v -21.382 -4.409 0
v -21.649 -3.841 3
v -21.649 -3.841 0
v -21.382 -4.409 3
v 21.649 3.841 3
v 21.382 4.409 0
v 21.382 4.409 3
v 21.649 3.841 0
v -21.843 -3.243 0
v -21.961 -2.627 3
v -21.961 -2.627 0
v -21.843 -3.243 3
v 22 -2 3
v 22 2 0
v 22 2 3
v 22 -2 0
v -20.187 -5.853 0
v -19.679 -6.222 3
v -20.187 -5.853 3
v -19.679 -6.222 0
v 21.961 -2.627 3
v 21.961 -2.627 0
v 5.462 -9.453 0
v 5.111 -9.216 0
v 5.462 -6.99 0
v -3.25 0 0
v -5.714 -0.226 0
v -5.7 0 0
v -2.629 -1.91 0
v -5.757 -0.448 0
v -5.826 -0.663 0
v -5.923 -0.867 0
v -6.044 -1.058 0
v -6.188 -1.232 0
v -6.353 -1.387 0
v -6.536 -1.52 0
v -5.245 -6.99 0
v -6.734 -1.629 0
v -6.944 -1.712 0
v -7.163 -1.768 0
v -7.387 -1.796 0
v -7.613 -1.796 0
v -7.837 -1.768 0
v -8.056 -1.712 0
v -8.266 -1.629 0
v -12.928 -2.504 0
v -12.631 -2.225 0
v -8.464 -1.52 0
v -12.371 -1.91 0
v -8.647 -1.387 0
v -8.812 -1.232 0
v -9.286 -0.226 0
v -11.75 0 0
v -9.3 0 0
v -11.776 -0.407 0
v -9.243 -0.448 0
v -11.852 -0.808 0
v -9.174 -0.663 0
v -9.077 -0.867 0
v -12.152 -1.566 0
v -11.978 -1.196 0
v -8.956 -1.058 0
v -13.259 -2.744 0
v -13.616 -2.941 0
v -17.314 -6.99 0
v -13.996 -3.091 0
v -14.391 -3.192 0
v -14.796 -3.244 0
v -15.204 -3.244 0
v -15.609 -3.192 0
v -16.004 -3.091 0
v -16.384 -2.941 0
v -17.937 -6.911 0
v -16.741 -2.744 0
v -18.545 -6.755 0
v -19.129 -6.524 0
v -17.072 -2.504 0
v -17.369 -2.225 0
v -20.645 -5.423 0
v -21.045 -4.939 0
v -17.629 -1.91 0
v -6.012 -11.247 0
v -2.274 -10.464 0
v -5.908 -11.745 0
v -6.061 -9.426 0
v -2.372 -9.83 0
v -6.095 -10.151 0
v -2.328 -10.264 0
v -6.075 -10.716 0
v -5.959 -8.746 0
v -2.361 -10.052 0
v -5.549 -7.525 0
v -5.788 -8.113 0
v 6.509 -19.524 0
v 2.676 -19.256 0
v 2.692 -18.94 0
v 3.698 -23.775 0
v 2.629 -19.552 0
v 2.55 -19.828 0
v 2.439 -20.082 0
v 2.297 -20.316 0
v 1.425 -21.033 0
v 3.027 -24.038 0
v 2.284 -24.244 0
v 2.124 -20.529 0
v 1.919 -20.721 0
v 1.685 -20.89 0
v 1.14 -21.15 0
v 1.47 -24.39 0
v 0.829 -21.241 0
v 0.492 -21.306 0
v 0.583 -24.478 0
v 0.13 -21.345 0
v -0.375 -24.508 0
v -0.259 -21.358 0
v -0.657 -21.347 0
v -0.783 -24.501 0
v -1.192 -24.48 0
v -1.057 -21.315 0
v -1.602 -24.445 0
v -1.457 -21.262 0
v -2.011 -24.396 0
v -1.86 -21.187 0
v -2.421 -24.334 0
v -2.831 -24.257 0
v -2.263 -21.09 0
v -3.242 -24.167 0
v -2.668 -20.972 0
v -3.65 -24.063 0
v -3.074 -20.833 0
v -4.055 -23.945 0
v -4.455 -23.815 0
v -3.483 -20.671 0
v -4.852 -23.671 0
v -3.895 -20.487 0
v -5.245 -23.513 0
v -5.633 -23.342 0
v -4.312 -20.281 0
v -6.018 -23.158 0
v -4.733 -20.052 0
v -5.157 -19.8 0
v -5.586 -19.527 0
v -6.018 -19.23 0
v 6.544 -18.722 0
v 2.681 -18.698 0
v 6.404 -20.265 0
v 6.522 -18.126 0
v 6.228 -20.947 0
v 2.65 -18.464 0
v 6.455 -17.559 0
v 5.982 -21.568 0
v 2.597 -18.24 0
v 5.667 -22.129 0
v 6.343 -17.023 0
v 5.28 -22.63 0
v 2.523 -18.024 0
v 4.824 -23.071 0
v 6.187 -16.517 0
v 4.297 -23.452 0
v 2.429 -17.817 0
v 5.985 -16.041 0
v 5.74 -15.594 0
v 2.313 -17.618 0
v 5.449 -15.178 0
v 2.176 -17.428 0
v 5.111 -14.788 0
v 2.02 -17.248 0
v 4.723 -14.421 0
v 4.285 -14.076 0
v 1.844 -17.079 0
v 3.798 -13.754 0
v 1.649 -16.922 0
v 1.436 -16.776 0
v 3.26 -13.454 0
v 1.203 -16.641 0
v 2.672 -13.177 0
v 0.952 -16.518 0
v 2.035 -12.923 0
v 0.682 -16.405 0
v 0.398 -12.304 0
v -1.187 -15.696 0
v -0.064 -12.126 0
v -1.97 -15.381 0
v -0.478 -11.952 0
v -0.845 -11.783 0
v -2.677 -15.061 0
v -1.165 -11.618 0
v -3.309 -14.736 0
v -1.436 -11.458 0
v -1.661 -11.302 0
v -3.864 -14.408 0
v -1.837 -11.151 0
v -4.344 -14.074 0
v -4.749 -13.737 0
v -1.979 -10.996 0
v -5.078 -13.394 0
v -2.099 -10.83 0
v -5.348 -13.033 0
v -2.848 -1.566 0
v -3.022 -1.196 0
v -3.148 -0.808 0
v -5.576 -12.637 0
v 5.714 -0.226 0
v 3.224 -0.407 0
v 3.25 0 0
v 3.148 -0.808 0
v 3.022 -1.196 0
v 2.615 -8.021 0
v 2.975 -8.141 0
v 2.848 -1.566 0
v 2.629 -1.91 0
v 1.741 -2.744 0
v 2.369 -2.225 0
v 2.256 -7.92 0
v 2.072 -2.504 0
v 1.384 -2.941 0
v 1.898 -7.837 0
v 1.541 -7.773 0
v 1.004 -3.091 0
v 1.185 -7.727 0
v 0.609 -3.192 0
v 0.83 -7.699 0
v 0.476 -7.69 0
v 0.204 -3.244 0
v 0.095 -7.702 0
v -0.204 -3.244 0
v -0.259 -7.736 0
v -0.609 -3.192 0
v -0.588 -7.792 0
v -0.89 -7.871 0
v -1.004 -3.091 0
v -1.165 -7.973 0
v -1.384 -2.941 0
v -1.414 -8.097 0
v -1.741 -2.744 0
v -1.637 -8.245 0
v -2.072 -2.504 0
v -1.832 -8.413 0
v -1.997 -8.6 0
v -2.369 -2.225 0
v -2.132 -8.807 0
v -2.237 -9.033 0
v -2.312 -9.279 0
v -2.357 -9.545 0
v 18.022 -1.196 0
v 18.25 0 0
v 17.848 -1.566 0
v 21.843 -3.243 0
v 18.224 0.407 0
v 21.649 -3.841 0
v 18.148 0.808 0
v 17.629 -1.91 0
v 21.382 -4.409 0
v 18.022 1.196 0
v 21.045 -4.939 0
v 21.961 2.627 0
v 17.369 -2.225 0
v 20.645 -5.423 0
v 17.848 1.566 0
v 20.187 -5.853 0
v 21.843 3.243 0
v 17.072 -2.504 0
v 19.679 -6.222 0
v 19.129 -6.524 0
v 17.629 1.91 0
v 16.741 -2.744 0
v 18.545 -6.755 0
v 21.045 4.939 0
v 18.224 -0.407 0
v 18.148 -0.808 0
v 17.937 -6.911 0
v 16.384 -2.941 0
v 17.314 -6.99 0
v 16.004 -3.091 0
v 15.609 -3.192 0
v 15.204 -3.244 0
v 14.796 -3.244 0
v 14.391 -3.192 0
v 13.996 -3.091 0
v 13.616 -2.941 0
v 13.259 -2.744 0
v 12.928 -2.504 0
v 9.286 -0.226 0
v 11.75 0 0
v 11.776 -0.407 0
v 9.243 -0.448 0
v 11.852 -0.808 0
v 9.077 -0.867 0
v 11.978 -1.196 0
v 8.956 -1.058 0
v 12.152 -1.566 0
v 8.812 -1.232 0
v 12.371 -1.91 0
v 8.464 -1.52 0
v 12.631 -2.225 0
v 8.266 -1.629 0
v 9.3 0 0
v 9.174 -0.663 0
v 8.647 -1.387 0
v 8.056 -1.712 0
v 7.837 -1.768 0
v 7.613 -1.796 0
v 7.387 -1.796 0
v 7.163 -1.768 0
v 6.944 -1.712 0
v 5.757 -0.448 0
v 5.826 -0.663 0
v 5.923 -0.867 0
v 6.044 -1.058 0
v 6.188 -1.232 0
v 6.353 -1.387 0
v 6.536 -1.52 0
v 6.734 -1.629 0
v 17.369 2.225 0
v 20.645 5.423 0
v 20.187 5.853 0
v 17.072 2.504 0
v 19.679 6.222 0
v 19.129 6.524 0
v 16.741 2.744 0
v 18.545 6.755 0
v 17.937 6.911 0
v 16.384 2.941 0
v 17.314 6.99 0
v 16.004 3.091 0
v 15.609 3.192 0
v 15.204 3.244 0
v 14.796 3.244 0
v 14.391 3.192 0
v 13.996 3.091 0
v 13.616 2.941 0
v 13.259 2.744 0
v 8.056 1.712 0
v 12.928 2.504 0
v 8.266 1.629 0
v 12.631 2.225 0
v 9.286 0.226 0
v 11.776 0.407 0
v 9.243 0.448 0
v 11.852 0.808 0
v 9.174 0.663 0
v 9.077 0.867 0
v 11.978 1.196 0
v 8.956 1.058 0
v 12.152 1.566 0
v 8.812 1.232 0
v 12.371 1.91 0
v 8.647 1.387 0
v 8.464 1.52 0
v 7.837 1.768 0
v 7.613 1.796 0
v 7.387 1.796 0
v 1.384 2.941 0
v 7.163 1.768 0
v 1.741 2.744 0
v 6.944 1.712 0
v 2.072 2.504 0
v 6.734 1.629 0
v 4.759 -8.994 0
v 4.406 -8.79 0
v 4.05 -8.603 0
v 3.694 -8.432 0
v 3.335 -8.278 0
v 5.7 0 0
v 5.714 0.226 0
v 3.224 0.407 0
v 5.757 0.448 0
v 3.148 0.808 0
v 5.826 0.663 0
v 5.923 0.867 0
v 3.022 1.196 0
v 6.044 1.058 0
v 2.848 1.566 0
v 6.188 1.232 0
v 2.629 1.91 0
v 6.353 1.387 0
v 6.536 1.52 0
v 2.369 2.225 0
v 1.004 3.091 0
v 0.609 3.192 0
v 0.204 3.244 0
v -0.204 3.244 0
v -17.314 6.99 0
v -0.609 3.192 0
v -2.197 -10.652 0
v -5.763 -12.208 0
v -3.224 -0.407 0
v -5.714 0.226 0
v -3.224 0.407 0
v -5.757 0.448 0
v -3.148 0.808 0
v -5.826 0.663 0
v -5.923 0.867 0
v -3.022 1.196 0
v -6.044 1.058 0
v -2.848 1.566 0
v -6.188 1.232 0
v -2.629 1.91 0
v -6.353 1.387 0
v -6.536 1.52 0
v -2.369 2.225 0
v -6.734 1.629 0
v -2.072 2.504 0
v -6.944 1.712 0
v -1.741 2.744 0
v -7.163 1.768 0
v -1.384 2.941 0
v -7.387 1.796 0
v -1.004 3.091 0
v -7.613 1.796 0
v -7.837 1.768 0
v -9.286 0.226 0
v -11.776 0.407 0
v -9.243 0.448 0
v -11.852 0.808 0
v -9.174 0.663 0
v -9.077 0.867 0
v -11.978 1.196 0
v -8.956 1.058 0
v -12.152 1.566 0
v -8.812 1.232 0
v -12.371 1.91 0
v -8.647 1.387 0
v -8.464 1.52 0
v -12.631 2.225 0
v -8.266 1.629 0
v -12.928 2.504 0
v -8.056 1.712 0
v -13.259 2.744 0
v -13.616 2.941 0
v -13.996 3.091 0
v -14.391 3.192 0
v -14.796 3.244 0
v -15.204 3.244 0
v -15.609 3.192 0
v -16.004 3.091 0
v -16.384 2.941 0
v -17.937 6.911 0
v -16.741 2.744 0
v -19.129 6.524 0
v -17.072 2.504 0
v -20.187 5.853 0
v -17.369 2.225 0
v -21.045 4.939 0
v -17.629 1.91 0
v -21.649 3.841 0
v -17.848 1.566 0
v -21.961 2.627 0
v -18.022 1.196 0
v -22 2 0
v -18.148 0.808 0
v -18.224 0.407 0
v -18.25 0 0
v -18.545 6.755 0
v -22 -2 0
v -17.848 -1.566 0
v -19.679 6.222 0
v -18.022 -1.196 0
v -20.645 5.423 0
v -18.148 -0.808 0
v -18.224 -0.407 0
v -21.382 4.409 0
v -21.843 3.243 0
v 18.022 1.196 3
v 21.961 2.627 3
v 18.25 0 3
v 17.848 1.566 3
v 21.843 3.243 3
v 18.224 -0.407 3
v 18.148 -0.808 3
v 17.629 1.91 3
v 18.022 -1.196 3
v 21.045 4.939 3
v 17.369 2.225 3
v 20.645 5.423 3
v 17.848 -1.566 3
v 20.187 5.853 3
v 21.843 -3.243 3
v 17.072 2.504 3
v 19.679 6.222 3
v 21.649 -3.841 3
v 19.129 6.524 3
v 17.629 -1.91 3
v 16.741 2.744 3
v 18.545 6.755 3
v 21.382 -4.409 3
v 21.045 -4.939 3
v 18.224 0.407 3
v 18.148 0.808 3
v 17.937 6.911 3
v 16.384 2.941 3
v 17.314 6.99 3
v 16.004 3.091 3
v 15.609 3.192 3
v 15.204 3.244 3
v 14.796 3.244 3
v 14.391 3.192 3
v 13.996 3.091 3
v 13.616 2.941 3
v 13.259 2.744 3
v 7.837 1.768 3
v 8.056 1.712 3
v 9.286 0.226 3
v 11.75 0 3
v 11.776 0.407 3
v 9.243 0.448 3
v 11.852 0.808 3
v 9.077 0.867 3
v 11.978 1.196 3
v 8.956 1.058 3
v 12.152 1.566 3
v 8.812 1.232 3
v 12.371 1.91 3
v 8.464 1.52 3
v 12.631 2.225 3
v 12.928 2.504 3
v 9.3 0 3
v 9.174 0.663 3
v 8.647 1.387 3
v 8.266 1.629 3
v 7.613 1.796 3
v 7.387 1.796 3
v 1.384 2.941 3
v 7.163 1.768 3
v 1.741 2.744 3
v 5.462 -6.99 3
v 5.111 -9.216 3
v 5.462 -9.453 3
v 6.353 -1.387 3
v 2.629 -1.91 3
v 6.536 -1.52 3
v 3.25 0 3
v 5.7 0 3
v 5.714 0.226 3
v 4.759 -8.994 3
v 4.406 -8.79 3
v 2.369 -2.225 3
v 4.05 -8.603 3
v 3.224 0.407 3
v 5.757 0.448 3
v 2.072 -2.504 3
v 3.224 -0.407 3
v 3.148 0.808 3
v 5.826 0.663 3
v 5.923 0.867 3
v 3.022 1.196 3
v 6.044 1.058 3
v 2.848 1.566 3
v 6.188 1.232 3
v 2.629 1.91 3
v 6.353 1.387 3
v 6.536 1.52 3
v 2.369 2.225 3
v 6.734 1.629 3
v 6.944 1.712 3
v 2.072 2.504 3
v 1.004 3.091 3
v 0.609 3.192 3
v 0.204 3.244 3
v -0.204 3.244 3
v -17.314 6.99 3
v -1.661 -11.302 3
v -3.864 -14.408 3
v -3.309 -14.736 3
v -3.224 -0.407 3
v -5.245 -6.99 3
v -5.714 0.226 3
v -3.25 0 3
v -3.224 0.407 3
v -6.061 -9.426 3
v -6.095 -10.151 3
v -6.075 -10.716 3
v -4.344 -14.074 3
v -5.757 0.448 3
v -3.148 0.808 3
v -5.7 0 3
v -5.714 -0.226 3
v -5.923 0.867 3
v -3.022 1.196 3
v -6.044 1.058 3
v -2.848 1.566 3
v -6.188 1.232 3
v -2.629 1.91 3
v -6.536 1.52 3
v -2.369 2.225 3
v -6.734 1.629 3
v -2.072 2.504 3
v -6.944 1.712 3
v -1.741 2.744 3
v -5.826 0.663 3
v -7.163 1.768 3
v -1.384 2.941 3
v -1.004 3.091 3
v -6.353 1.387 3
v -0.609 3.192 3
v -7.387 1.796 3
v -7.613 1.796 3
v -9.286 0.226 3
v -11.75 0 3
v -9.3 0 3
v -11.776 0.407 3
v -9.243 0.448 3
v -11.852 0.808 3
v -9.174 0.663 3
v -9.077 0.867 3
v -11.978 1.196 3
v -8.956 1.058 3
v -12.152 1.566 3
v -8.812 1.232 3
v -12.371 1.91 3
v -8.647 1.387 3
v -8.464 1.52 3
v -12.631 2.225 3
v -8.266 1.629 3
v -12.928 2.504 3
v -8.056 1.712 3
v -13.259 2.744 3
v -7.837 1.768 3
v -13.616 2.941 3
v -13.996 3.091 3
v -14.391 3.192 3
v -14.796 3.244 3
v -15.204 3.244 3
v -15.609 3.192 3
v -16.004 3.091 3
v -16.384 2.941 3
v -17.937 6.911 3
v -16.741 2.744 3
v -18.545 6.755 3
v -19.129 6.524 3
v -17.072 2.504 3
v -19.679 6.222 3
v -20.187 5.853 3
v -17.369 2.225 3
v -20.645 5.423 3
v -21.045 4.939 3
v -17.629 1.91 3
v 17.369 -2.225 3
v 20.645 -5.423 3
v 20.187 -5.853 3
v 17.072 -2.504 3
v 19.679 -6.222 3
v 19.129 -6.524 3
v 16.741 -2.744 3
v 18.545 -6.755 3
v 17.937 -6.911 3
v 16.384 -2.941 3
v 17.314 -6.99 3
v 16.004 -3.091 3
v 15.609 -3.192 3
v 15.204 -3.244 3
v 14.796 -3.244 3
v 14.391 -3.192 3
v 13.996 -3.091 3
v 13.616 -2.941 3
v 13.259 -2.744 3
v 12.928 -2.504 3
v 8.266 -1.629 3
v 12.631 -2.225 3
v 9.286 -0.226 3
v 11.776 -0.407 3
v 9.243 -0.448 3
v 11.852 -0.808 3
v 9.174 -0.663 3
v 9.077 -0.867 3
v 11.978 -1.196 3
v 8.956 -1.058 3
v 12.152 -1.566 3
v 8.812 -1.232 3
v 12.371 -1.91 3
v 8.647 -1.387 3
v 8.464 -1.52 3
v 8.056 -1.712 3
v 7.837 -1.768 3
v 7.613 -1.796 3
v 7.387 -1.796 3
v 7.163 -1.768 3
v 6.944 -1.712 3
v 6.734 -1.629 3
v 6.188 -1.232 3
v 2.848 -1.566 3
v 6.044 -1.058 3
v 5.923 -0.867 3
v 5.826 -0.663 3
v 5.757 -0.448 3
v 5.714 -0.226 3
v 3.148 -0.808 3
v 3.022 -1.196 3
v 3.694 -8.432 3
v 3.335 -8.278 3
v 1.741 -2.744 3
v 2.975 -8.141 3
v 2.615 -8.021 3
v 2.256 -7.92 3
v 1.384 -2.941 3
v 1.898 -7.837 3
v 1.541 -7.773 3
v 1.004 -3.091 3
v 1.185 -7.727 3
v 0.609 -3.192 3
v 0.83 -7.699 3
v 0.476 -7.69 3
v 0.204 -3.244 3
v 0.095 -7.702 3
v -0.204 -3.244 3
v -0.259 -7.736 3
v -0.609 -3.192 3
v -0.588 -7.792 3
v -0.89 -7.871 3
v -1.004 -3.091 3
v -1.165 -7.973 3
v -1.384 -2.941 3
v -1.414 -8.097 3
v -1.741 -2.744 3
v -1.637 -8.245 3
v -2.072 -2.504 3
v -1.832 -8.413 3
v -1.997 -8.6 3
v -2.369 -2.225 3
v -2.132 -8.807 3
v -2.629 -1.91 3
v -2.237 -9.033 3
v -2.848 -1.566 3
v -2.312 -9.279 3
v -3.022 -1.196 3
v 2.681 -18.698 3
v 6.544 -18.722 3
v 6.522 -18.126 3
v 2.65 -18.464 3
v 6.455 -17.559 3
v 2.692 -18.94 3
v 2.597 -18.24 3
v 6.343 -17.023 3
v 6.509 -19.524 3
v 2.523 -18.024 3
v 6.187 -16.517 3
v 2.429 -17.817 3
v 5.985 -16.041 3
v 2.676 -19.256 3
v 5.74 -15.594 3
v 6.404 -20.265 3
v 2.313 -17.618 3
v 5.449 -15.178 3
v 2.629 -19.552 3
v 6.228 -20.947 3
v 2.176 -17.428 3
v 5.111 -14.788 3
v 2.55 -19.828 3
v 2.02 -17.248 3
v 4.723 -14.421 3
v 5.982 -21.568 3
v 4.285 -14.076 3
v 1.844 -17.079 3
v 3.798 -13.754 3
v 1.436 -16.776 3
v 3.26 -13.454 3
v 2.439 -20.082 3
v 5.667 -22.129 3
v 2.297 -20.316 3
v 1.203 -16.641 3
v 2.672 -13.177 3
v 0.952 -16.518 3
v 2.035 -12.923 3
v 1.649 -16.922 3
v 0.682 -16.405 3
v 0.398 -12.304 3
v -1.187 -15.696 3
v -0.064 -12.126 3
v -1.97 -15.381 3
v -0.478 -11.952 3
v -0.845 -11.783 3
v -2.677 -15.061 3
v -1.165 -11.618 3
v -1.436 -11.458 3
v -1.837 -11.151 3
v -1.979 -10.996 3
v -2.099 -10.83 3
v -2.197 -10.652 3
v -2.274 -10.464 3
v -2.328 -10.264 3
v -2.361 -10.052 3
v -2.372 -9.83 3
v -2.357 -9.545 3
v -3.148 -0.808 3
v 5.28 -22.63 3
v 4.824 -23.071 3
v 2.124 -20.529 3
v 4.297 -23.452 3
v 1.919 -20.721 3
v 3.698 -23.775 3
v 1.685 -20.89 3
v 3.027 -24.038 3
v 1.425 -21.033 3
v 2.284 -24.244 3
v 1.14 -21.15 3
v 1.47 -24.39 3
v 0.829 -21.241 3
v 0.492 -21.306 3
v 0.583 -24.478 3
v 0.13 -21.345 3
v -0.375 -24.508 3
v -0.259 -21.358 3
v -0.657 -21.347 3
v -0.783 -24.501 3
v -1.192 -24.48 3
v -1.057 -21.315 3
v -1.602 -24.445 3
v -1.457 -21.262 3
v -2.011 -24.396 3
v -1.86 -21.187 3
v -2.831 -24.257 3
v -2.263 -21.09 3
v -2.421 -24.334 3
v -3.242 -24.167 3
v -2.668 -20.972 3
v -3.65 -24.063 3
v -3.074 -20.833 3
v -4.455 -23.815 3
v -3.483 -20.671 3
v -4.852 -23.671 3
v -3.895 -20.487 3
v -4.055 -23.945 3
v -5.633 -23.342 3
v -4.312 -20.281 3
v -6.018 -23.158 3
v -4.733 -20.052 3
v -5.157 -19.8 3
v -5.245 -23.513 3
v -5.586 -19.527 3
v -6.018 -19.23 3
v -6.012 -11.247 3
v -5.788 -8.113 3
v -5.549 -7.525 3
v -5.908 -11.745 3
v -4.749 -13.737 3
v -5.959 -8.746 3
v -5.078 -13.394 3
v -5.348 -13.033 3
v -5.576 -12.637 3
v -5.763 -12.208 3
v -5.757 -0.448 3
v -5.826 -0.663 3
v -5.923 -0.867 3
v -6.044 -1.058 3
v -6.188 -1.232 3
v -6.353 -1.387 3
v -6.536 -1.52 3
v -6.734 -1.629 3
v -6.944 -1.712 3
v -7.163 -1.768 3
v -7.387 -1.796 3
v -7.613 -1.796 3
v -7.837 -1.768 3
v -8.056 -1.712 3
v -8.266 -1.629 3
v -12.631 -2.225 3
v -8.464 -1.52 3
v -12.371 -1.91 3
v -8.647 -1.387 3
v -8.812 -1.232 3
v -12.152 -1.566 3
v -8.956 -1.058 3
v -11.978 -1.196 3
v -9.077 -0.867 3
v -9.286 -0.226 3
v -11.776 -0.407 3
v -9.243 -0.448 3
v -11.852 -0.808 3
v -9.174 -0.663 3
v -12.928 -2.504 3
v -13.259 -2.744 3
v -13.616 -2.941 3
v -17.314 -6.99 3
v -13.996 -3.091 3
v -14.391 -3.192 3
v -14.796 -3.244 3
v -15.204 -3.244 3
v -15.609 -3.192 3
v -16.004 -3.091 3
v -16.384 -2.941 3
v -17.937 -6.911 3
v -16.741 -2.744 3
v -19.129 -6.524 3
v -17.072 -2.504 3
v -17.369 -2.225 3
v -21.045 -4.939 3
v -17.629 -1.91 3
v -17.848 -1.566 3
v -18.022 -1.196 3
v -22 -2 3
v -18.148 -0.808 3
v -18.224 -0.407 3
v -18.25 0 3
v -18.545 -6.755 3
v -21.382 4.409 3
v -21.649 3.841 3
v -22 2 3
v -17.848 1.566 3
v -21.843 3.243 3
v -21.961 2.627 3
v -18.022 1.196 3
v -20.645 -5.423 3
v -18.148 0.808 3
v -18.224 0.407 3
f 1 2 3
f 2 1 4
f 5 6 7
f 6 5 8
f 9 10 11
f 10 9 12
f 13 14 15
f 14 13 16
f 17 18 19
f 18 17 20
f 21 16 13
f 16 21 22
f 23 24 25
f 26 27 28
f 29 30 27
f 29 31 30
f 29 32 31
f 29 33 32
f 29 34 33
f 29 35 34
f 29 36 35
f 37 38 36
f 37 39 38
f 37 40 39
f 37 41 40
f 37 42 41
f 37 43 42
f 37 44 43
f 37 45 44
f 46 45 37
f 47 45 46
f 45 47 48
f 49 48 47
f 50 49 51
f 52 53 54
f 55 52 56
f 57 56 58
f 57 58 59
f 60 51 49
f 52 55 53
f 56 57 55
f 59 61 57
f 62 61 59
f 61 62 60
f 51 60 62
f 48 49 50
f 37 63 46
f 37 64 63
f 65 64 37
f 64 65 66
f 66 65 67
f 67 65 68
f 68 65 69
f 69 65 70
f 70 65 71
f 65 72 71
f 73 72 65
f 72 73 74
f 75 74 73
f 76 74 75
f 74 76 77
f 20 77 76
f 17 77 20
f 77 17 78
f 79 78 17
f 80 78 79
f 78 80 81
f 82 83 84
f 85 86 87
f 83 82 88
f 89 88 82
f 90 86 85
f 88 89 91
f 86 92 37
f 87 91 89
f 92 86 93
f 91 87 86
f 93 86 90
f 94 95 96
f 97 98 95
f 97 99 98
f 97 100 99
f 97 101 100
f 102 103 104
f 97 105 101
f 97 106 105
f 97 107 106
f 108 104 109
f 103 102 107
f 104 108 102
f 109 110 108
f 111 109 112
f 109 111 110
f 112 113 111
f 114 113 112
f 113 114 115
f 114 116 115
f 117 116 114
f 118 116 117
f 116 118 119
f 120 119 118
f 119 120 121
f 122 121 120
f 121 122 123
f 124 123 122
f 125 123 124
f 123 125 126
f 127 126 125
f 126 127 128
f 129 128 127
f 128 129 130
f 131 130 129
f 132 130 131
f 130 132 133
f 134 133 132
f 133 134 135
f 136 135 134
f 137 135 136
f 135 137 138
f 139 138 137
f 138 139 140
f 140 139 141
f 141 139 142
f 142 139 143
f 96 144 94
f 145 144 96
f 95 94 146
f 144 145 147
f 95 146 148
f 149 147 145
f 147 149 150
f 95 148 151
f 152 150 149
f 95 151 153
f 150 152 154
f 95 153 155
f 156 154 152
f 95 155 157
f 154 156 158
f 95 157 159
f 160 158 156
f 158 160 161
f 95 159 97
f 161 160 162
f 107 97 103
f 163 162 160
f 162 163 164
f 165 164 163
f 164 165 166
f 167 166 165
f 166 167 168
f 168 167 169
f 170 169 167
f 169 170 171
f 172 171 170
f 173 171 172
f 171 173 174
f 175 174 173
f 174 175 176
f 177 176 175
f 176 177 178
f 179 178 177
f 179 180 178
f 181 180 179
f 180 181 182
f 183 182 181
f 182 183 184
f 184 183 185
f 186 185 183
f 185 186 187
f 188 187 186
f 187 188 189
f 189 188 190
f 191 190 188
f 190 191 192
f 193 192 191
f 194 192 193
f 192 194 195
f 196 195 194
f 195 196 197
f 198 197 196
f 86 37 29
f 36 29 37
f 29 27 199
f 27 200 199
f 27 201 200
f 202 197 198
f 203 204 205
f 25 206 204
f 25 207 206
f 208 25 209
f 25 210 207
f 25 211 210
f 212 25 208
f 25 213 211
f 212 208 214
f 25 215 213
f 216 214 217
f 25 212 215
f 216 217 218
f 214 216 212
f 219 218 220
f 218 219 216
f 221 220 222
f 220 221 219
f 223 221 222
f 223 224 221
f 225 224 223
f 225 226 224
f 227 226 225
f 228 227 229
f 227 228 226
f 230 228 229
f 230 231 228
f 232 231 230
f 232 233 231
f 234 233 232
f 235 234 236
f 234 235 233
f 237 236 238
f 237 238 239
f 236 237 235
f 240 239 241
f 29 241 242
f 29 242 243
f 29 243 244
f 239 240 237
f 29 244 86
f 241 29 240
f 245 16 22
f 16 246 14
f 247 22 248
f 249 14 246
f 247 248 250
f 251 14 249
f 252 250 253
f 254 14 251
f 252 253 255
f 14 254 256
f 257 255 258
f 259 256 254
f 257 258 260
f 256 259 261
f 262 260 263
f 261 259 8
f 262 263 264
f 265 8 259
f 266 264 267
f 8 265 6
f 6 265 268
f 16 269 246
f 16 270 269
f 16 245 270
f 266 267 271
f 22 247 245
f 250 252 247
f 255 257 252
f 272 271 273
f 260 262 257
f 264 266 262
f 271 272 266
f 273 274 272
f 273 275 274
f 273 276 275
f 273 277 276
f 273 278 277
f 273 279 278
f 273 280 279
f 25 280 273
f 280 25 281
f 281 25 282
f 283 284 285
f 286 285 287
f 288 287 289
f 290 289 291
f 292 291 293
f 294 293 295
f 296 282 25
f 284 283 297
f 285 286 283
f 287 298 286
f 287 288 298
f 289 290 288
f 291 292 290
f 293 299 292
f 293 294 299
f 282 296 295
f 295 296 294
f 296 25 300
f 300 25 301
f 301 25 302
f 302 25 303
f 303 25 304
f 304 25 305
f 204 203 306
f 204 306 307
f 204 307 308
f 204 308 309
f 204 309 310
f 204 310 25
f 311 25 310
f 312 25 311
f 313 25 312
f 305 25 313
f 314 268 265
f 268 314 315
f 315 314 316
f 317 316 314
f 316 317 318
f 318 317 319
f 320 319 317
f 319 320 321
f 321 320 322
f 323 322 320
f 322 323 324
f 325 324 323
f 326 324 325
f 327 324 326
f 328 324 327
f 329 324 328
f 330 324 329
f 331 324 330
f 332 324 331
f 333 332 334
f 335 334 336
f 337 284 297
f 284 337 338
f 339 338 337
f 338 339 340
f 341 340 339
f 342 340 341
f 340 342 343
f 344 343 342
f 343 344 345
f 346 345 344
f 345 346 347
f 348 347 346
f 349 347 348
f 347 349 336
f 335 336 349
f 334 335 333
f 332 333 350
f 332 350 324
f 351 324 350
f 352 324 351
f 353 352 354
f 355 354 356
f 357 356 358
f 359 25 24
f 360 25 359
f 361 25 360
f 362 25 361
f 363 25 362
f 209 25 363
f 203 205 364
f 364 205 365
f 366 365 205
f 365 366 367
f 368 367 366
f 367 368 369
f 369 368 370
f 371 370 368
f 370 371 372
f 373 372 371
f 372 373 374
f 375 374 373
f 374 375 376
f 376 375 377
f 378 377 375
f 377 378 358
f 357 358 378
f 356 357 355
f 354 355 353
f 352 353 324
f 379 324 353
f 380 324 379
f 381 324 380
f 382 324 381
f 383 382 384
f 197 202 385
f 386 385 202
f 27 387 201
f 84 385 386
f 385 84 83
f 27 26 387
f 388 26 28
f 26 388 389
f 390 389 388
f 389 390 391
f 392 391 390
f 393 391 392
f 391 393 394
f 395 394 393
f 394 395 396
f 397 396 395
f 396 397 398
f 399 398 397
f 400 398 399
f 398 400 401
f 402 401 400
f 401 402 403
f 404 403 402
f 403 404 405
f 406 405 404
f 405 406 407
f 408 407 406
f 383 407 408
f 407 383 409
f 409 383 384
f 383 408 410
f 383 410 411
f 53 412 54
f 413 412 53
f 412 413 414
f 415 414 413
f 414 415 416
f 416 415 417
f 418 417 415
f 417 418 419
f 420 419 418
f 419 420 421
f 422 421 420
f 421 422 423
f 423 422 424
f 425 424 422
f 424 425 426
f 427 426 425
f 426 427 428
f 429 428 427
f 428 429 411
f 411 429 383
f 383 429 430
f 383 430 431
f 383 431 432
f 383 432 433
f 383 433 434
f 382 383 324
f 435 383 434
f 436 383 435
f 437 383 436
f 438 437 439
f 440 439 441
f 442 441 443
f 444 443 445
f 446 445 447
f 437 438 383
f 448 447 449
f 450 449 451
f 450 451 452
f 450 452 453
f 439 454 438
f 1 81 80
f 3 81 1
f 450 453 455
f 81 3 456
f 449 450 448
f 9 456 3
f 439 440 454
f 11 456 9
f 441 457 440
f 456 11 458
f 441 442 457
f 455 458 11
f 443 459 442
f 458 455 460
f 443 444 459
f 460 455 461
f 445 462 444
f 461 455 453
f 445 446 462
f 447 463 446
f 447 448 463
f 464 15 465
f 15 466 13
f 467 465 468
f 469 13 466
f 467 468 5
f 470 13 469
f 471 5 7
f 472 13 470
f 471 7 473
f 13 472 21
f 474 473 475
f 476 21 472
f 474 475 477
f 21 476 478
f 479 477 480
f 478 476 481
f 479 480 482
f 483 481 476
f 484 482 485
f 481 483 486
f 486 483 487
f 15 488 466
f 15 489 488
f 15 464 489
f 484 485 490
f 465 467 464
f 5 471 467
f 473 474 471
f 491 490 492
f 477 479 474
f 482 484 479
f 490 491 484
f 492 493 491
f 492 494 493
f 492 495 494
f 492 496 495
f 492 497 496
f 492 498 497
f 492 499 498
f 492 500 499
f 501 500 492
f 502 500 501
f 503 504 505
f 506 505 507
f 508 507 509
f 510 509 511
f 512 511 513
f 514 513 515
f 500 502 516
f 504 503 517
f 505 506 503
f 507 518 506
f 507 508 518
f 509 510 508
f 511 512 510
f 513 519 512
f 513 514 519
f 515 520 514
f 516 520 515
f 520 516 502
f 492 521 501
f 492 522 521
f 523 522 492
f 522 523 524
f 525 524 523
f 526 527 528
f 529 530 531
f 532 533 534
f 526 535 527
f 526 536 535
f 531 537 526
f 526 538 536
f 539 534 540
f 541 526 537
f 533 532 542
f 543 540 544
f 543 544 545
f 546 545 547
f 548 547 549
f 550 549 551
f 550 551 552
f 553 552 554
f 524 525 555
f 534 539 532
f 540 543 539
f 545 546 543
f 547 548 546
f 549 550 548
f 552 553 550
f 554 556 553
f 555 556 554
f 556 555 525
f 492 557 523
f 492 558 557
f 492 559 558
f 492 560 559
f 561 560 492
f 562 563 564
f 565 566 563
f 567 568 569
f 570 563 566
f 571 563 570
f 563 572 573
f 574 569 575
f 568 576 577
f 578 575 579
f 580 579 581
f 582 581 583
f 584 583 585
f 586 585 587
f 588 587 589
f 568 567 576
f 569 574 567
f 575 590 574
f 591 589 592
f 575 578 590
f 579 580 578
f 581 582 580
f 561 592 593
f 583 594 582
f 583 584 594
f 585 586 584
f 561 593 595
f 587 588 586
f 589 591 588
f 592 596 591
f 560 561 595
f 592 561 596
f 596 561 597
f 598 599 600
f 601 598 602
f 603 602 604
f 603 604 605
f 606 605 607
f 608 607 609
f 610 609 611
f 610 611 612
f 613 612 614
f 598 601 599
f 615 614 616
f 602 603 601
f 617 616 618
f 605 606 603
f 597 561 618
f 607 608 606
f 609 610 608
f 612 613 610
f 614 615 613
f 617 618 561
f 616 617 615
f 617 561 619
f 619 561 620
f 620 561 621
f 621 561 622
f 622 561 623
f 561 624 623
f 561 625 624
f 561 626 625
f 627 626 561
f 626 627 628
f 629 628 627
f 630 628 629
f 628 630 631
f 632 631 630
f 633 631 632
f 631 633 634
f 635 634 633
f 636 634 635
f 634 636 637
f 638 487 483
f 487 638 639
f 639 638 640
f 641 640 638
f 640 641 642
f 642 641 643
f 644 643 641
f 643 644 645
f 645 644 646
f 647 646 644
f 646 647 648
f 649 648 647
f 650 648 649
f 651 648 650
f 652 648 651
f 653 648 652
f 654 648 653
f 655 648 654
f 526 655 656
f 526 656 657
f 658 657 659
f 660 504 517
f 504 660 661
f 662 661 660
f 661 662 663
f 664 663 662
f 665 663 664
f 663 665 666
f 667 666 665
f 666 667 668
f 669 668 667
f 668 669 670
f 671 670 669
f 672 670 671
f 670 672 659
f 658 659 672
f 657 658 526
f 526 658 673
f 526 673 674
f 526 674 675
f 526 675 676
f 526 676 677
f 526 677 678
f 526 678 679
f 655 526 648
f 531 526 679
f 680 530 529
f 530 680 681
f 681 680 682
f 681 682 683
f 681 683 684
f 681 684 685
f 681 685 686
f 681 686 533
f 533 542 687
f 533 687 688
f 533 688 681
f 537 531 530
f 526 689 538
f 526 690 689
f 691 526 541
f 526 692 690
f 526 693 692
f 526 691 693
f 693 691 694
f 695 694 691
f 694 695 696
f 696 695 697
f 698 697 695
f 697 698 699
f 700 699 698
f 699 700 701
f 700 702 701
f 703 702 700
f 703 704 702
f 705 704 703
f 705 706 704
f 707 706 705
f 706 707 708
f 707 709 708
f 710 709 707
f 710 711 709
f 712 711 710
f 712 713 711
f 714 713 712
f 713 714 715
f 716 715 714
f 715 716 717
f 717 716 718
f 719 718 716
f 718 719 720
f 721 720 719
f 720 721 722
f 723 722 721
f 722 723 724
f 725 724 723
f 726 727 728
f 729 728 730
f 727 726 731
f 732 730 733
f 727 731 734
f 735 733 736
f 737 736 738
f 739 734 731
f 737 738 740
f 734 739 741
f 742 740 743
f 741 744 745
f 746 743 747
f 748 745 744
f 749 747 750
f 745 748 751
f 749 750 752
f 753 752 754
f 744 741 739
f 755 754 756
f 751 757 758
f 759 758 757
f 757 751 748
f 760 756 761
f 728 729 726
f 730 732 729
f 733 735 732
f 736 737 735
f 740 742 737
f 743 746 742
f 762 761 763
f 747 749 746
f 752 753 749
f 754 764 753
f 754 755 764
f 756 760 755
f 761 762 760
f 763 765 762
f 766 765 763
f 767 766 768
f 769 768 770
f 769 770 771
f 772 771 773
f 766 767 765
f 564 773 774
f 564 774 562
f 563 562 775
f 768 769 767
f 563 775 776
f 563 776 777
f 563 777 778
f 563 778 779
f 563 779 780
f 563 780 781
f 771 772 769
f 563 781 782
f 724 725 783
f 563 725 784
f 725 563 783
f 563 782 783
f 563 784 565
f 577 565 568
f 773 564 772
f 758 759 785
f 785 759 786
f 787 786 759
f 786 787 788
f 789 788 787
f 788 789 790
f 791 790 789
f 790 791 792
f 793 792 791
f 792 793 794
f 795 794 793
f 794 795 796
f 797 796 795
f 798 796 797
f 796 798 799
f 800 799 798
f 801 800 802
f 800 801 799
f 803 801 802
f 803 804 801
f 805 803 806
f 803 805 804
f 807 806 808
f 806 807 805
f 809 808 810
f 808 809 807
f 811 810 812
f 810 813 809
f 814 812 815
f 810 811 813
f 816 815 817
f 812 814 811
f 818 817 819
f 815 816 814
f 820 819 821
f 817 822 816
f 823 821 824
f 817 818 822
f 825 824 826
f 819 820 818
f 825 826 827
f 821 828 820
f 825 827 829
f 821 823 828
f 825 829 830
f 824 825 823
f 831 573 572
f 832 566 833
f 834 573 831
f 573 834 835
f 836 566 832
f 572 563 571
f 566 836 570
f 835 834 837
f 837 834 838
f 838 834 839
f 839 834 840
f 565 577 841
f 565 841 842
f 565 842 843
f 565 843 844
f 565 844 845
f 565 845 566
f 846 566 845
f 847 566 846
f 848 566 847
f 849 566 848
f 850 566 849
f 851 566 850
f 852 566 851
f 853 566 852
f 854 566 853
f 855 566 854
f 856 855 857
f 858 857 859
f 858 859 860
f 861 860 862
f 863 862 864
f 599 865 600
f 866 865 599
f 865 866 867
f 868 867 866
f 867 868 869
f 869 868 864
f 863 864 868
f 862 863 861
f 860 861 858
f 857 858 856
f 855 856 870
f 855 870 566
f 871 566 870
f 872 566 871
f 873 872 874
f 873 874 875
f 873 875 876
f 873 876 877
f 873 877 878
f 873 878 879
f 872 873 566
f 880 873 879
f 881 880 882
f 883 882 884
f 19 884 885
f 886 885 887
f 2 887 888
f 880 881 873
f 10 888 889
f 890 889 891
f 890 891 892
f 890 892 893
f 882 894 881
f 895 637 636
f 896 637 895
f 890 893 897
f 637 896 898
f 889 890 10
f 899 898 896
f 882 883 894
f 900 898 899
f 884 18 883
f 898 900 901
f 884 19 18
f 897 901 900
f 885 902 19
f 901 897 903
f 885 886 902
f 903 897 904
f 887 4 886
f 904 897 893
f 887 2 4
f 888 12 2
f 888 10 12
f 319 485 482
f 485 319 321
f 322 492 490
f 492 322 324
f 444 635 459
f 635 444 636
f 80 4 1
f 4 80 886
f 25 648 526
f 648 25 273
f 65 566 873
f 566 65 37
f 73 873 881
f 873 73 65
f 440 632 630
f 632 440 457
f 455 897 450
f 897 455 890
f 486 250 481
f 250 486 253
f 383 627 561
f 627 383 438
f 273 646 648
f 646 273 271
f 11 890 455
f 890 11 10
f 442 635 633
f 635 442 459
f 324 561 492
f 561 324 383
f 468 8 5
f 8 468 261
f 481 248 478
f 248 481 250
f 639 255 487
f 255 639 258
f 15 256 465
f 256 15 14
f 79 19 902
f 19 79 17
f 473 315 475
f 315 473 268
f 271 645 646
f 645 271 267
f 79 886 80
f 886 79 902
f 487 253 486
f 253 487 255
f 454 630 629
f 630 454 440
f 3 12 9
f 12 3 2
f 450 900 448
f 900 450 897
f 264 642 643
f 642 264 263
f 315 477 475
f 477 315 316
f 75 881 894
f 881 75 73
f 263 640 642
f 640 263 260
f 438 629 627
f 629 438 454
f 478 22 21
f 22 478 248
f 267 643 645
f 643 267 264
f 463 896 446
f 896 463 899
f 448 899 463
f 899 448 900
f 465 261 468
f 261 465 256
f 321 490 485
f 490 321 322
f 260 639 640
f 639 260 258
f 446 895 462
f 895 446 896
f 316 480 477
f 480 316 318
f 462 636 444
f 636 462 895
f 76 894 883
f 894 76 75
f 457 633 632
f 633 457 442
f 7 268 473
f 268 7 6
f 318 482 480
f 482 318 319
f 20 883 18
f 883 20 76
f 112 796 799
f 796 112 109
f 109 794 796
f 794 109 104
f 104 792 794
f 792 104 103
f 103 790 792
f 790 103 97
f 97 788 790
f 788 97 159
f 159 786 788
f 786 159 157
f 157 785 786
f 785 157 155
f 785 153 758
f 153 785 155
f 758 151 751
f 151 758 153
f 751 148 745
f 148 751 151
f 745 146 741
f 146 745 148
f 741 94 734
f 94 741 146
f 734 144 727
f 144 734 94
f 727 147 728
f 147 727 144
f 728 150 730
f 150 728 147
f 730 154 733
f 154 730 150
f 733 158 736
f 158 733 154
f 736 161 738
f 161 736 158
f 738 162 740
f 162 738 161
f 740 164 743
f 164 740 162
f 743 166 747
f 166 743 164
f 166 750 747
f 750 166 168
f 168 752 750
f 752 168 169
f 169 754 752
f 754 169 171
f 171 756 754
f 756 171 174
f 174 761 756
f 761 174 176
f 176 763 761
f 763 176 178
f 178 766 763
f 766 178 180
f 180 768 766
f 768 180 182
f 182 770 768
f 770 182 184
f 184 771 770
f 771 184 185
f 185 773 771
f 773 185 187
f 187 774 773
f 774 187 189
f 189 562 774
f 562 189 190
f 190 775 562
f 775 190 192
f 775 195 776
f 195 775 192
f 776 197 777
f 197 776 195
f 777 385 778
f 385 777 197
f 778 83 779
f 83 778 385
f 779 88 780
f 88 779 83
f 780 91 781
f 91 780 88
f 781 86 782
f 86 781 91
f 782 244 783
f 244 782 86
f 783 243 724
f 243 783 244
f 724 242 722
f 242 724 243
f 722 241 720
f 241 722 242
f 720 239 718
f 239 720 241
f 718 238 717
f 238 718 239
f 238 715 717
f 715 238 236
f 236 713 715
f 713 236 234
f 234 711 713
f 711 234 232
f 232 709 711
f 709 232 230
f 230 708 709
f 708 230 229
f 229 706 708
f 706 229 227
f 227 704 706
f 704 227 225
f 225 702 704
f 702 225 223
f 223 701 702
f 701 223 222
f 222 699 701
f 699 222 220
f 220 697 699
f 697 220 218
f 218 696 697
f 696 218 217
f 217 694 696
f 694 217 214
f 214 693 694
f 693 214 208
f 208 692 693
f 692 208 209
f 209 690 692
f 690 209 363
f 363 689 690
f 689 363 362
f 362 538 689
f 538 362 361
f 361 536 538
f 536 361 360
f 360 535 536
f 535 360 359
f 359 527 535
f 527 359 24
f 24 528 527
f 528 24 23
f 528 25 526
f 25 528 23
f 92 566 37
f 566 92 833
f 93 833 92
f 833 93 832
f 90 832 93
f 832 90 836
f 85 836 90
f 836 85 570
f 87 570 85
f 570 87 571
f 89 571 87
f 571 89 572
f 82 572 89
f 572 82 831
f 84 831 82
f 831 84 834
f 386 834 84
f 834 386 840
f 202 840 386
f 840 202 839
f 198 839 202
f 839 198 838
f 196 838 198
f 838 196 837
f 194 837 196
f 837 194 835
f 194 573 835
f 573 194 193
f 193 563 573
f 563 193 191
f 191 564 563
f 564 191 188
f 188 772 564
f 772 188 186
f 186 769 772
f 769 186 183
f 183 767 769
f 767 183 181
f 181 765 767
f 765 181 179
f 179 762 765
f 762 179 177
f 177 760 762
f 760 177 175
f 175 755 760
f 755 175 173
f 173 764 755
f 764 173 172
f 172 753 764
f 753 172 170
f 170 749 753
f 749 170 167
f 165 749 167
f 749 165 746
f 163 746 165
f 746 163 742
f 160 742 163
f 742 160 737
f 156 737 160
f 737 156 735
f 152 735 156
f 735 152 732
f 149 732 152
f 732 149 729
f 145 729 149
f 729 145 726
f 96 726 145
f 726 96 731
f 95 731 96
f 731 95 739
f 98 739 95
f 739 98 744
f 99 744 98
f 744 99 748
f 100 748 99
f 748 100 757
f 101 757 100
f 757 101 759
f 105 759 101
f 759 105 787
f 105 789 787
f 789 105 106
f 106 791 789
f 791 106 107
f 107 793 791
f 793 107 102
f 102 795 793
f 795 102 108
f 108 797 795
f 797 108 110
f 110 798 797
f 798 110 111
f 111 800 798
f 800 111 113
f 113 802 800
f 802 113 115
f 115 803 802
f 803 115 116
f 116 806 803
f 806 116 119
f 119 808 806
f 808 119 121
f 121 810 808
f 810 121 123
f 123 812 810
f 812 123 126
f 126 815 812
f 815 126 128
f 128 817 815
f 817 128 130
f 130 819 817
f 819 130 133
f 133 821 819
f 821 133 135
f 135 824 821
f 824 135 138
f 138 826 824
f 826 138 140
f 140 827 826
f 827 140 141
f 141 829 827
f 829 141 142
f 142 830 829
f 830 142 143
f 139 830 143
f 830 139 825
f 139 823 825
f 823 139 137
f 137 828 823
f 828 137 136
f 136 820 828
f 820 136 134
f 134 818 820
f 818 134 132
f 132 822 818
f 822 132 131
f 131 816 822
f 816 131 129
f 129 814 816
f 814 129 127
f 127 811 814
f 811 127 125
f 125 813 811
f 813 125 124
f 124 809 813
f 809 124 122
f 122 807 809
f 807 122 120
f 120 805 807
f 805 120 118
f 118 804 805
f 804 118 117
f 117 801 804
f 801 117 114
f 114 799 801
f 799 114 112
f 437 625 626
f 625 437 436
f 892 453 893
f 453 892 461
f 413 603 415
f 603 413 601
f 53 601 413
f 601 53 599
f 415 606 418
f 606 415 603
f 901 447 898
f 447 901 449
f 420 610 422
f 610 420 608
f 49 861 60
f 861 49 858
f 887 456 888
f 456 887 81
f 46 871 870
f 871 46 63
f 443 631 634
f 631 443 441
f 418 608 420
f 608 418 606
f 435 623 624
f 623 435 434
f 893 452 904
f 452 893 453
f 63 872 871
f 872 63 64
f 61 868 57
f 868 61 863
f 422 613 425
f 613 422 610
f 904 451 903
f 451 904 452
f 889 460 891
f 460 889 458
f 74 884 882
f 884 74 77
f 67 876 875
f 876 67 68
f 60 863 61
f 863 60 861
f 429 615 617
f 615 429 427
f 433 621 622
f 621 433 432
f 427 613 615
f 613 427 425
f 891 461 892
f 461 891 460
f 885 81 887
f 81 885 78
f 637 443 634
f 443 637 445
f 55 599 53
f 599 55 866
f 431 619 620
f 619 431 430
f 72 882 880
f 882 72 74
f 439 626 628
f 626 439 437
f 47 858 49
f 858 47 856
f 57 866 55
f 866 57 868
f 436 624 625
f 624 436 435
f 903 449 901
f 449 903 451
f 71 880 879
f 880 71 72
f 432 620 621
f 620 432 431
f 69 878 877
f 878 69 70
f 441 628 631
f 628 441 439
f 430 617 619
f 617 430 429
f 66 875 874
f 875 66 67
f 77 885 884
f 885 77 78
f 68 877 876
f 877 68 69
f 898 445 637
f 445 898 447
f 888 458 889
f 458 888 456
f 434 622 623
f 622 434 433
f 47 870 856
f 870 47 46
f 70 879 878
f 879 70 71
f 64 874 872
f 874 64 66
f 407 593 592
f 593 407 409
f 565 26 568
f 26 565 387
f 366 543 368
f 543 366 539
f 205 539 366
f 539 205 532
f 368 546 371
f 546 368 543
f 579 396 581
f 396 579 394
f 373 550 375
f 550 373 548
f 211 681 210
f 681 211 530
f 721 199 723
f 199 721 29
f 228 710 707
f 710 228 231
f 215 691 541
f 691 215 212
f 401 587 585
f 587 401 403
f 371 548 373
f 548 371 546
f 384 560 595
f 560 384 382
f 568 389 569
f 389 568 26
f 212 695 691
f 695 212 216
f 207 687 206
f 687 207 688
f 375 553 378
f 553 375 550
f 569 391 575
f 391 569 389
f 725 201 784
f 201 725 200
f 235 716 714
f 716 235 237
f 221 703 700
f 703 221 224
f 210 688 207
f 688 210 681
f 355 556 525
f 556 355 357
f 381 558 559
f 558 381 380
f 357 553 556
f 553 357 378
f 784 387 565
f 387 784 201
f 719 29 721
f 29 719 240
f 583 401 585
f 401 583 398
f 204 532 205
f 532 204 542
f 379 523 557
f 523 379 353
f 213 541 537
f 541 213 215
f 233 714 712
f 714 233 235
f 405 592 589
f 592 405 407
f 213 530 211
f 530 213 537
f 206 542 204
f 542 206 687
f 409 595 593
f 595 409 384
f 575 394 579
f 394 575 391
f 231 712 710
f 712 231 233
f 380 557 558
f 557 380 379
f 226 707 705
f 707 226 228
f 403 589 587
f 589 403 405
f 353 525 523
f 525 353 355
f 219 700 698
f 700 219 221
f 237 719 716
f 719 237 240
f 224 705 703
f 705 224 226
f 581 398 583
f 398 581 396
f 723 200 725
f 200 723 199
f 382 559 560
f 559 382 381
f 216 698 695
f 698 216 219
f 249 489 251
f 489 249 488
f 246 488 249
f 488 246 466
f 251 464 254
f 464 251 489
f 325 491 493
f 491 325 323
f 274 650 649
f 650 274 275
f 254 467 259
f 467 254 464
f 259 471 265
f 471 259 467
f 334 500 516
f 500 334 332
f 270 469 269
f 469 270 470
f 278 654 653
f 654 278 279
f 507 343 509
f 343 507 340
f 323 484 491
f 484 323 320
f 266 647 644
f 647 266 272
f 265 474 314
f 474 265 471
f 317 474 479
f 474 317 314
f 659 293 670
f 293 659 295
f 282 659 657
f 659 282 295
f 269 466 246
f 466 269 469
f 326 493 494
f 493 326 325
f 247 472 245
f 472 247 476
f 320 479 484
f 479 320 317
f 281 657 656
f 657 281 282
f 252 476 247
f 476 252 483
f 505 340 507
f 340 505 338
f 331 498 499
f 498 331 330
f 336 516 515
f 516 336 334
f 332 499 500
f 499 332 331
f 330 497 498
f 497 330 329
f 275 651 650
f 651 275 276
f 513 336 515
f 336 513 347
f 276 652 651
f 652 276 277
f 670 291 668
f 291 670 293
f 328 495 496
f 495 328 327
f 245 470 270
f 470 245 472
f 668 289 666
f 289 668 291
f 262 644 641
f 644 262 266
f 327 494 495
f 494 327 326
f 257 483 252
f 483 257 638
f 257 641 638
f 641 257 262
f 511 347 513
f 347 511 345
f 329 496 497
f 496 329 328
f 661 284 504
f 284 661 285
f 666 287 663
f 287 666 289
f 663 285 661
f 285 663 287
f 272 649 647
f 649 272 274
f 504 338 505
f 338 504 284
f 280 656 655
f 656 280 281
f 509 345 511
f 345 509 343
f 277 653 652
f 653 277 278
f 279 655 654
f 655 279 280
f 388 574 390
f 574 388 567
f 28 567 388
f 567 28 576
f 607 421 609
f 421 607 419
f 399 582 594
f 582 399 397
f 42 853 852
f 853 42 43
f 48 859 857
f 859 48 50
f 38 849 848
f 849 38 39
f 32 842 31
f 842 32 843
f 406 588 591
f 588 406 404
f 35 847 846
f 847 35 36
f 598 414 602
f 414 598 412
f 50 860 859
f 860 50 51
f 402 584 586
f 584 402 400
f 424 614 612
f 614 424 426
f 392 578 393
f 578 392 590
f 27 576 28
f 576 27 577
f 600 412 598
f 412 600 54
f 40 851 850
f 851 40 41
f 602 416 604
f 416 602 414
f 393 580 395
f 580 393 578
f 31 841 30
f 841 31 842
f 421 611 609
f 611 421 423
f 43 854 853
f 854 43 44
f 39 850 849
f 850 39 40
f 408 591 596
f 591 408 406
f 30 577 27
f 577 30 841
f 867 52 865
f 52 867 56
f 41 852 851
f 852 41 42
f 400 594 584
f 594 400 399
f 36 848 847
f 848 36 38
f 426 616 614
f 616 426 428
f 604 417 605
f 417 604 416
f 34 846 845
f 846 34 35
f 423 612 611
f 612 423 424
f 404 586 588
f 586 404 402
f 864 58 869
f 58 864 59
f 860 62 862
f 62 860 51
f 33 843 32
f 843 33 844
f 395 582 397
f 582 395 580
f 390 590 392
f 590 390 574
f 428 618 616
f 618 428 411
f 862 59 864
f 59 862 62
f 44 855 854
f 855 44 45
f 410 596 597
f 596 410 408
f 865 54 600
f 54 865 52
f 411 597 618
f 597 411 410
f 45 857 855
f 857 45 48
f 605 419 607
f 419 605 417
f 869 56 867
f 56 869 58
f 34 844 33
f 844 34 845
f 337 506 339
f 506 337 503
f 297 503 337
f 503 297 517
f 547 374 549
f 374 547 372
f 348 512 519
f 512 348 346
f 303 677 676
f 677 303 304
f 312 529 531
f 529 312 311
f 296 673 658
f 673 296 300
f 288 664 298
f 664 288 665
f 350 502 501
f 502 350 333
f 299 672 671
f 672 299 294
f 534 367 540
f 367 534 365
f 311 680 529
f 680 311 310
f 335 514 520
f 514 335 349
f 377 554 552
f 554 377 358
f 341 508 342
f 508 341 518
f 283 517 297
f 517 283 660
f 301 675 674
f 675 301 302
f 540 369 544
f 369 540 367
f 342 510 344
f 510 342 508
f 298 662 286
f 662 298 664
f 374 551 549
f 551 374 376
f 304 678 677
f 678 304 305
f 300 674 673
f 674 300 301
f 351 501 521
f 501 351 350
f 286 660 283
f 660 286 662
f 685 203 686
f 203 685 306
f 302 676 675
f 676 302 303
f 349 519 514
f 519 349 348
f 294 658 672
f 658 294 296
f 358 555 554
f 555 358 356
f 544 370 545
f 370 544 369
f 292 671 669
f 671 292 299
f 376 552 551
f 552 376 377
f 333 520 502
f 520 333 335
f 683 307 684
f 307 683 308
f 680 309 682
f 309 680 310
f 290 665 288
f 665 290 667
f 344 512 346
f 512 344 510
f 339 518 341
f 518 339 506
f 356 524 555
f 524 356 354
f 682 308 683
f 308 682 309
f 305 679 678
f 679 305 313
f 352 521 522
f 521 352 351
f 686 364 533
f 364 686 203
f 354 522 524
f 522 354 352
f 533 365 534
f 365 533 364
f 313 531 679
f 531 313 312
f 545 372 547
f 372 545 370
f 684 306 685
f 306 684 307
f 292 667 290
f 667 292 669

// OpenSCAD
$fn = 50;


difference() {
	union() {
		hull() {
			translate(v = [-17.0000000000, 2.0000000000, 0]) {
				cylinder(h = 3, r = 5);
			}
			translate(v = [17.0000000000, 2.0000000000, 0]) {
				cylinder(h = 3, r = 5);
			}
			translate(v = [-17.0000000000, -2.0000000000, 0]) {
				cylinder(h = 3, r = 5);
			}
			translate(v = [17.0000000000, -2.0000000000, 0]) {
				cylinder(h = 3, r = 5);
			}
		}
		translate(v = [0, -5, 0]) {
			linear_extrude(height = 3) {
				text(font = "DejaVu Sans Mono:style=Bold", halign = "center", size = 19.0000000000, text = "S", valign = "top");
			}
		}
	}
	union() {
		translate(v = [-15.0000000000, 0.0000000000, 0]) {
			translate(v = [0, 0, -100]) {
				cylinder(h = 200, r = 3.2500000000);
			}
		}
		translate(v = [0, 0, -100]) {
			cylinder(h = 200, r = 3.2500000000);
		}
		translate(v = [15.0000000000, 0.0000000000, 0]) {
			translate(v = [0, 0, -100]) {
				cylinder(h = 200, r = 3.2500000000);
			}
		}
		translate(v = [-15.0000000000, 0.0000000000, 0]) {
			translate(v = [0, 0, -100]) {
				cylinder(h = 200, r = 1.8000000000);
			}
		}
		translate(v = [-7.5000000000, 0.0000000000, 0]) {
			translate(v = [0, 0, -100]) {
				cylinder(h = 200, r = 1.8000000000);
			}
		}
		translate(v = [0, 0, -100]) {
			cylinder(h = 200, r = 1.8000000000);
		}
		translate(v = [7.5000000000, 0.0000000000, 0]) {
			translate(v = [0, 0, -100]) {
				cylinder(h = 200, r = 1.8000000000);
			}
		}
		translate(v = [15.0000000000, 0.0000000000, 0]) {
			translate(v = [0, 0, -100]) {
				cylinder(h = 200, r = 1.8000000000);
			}
		}
	}
}
